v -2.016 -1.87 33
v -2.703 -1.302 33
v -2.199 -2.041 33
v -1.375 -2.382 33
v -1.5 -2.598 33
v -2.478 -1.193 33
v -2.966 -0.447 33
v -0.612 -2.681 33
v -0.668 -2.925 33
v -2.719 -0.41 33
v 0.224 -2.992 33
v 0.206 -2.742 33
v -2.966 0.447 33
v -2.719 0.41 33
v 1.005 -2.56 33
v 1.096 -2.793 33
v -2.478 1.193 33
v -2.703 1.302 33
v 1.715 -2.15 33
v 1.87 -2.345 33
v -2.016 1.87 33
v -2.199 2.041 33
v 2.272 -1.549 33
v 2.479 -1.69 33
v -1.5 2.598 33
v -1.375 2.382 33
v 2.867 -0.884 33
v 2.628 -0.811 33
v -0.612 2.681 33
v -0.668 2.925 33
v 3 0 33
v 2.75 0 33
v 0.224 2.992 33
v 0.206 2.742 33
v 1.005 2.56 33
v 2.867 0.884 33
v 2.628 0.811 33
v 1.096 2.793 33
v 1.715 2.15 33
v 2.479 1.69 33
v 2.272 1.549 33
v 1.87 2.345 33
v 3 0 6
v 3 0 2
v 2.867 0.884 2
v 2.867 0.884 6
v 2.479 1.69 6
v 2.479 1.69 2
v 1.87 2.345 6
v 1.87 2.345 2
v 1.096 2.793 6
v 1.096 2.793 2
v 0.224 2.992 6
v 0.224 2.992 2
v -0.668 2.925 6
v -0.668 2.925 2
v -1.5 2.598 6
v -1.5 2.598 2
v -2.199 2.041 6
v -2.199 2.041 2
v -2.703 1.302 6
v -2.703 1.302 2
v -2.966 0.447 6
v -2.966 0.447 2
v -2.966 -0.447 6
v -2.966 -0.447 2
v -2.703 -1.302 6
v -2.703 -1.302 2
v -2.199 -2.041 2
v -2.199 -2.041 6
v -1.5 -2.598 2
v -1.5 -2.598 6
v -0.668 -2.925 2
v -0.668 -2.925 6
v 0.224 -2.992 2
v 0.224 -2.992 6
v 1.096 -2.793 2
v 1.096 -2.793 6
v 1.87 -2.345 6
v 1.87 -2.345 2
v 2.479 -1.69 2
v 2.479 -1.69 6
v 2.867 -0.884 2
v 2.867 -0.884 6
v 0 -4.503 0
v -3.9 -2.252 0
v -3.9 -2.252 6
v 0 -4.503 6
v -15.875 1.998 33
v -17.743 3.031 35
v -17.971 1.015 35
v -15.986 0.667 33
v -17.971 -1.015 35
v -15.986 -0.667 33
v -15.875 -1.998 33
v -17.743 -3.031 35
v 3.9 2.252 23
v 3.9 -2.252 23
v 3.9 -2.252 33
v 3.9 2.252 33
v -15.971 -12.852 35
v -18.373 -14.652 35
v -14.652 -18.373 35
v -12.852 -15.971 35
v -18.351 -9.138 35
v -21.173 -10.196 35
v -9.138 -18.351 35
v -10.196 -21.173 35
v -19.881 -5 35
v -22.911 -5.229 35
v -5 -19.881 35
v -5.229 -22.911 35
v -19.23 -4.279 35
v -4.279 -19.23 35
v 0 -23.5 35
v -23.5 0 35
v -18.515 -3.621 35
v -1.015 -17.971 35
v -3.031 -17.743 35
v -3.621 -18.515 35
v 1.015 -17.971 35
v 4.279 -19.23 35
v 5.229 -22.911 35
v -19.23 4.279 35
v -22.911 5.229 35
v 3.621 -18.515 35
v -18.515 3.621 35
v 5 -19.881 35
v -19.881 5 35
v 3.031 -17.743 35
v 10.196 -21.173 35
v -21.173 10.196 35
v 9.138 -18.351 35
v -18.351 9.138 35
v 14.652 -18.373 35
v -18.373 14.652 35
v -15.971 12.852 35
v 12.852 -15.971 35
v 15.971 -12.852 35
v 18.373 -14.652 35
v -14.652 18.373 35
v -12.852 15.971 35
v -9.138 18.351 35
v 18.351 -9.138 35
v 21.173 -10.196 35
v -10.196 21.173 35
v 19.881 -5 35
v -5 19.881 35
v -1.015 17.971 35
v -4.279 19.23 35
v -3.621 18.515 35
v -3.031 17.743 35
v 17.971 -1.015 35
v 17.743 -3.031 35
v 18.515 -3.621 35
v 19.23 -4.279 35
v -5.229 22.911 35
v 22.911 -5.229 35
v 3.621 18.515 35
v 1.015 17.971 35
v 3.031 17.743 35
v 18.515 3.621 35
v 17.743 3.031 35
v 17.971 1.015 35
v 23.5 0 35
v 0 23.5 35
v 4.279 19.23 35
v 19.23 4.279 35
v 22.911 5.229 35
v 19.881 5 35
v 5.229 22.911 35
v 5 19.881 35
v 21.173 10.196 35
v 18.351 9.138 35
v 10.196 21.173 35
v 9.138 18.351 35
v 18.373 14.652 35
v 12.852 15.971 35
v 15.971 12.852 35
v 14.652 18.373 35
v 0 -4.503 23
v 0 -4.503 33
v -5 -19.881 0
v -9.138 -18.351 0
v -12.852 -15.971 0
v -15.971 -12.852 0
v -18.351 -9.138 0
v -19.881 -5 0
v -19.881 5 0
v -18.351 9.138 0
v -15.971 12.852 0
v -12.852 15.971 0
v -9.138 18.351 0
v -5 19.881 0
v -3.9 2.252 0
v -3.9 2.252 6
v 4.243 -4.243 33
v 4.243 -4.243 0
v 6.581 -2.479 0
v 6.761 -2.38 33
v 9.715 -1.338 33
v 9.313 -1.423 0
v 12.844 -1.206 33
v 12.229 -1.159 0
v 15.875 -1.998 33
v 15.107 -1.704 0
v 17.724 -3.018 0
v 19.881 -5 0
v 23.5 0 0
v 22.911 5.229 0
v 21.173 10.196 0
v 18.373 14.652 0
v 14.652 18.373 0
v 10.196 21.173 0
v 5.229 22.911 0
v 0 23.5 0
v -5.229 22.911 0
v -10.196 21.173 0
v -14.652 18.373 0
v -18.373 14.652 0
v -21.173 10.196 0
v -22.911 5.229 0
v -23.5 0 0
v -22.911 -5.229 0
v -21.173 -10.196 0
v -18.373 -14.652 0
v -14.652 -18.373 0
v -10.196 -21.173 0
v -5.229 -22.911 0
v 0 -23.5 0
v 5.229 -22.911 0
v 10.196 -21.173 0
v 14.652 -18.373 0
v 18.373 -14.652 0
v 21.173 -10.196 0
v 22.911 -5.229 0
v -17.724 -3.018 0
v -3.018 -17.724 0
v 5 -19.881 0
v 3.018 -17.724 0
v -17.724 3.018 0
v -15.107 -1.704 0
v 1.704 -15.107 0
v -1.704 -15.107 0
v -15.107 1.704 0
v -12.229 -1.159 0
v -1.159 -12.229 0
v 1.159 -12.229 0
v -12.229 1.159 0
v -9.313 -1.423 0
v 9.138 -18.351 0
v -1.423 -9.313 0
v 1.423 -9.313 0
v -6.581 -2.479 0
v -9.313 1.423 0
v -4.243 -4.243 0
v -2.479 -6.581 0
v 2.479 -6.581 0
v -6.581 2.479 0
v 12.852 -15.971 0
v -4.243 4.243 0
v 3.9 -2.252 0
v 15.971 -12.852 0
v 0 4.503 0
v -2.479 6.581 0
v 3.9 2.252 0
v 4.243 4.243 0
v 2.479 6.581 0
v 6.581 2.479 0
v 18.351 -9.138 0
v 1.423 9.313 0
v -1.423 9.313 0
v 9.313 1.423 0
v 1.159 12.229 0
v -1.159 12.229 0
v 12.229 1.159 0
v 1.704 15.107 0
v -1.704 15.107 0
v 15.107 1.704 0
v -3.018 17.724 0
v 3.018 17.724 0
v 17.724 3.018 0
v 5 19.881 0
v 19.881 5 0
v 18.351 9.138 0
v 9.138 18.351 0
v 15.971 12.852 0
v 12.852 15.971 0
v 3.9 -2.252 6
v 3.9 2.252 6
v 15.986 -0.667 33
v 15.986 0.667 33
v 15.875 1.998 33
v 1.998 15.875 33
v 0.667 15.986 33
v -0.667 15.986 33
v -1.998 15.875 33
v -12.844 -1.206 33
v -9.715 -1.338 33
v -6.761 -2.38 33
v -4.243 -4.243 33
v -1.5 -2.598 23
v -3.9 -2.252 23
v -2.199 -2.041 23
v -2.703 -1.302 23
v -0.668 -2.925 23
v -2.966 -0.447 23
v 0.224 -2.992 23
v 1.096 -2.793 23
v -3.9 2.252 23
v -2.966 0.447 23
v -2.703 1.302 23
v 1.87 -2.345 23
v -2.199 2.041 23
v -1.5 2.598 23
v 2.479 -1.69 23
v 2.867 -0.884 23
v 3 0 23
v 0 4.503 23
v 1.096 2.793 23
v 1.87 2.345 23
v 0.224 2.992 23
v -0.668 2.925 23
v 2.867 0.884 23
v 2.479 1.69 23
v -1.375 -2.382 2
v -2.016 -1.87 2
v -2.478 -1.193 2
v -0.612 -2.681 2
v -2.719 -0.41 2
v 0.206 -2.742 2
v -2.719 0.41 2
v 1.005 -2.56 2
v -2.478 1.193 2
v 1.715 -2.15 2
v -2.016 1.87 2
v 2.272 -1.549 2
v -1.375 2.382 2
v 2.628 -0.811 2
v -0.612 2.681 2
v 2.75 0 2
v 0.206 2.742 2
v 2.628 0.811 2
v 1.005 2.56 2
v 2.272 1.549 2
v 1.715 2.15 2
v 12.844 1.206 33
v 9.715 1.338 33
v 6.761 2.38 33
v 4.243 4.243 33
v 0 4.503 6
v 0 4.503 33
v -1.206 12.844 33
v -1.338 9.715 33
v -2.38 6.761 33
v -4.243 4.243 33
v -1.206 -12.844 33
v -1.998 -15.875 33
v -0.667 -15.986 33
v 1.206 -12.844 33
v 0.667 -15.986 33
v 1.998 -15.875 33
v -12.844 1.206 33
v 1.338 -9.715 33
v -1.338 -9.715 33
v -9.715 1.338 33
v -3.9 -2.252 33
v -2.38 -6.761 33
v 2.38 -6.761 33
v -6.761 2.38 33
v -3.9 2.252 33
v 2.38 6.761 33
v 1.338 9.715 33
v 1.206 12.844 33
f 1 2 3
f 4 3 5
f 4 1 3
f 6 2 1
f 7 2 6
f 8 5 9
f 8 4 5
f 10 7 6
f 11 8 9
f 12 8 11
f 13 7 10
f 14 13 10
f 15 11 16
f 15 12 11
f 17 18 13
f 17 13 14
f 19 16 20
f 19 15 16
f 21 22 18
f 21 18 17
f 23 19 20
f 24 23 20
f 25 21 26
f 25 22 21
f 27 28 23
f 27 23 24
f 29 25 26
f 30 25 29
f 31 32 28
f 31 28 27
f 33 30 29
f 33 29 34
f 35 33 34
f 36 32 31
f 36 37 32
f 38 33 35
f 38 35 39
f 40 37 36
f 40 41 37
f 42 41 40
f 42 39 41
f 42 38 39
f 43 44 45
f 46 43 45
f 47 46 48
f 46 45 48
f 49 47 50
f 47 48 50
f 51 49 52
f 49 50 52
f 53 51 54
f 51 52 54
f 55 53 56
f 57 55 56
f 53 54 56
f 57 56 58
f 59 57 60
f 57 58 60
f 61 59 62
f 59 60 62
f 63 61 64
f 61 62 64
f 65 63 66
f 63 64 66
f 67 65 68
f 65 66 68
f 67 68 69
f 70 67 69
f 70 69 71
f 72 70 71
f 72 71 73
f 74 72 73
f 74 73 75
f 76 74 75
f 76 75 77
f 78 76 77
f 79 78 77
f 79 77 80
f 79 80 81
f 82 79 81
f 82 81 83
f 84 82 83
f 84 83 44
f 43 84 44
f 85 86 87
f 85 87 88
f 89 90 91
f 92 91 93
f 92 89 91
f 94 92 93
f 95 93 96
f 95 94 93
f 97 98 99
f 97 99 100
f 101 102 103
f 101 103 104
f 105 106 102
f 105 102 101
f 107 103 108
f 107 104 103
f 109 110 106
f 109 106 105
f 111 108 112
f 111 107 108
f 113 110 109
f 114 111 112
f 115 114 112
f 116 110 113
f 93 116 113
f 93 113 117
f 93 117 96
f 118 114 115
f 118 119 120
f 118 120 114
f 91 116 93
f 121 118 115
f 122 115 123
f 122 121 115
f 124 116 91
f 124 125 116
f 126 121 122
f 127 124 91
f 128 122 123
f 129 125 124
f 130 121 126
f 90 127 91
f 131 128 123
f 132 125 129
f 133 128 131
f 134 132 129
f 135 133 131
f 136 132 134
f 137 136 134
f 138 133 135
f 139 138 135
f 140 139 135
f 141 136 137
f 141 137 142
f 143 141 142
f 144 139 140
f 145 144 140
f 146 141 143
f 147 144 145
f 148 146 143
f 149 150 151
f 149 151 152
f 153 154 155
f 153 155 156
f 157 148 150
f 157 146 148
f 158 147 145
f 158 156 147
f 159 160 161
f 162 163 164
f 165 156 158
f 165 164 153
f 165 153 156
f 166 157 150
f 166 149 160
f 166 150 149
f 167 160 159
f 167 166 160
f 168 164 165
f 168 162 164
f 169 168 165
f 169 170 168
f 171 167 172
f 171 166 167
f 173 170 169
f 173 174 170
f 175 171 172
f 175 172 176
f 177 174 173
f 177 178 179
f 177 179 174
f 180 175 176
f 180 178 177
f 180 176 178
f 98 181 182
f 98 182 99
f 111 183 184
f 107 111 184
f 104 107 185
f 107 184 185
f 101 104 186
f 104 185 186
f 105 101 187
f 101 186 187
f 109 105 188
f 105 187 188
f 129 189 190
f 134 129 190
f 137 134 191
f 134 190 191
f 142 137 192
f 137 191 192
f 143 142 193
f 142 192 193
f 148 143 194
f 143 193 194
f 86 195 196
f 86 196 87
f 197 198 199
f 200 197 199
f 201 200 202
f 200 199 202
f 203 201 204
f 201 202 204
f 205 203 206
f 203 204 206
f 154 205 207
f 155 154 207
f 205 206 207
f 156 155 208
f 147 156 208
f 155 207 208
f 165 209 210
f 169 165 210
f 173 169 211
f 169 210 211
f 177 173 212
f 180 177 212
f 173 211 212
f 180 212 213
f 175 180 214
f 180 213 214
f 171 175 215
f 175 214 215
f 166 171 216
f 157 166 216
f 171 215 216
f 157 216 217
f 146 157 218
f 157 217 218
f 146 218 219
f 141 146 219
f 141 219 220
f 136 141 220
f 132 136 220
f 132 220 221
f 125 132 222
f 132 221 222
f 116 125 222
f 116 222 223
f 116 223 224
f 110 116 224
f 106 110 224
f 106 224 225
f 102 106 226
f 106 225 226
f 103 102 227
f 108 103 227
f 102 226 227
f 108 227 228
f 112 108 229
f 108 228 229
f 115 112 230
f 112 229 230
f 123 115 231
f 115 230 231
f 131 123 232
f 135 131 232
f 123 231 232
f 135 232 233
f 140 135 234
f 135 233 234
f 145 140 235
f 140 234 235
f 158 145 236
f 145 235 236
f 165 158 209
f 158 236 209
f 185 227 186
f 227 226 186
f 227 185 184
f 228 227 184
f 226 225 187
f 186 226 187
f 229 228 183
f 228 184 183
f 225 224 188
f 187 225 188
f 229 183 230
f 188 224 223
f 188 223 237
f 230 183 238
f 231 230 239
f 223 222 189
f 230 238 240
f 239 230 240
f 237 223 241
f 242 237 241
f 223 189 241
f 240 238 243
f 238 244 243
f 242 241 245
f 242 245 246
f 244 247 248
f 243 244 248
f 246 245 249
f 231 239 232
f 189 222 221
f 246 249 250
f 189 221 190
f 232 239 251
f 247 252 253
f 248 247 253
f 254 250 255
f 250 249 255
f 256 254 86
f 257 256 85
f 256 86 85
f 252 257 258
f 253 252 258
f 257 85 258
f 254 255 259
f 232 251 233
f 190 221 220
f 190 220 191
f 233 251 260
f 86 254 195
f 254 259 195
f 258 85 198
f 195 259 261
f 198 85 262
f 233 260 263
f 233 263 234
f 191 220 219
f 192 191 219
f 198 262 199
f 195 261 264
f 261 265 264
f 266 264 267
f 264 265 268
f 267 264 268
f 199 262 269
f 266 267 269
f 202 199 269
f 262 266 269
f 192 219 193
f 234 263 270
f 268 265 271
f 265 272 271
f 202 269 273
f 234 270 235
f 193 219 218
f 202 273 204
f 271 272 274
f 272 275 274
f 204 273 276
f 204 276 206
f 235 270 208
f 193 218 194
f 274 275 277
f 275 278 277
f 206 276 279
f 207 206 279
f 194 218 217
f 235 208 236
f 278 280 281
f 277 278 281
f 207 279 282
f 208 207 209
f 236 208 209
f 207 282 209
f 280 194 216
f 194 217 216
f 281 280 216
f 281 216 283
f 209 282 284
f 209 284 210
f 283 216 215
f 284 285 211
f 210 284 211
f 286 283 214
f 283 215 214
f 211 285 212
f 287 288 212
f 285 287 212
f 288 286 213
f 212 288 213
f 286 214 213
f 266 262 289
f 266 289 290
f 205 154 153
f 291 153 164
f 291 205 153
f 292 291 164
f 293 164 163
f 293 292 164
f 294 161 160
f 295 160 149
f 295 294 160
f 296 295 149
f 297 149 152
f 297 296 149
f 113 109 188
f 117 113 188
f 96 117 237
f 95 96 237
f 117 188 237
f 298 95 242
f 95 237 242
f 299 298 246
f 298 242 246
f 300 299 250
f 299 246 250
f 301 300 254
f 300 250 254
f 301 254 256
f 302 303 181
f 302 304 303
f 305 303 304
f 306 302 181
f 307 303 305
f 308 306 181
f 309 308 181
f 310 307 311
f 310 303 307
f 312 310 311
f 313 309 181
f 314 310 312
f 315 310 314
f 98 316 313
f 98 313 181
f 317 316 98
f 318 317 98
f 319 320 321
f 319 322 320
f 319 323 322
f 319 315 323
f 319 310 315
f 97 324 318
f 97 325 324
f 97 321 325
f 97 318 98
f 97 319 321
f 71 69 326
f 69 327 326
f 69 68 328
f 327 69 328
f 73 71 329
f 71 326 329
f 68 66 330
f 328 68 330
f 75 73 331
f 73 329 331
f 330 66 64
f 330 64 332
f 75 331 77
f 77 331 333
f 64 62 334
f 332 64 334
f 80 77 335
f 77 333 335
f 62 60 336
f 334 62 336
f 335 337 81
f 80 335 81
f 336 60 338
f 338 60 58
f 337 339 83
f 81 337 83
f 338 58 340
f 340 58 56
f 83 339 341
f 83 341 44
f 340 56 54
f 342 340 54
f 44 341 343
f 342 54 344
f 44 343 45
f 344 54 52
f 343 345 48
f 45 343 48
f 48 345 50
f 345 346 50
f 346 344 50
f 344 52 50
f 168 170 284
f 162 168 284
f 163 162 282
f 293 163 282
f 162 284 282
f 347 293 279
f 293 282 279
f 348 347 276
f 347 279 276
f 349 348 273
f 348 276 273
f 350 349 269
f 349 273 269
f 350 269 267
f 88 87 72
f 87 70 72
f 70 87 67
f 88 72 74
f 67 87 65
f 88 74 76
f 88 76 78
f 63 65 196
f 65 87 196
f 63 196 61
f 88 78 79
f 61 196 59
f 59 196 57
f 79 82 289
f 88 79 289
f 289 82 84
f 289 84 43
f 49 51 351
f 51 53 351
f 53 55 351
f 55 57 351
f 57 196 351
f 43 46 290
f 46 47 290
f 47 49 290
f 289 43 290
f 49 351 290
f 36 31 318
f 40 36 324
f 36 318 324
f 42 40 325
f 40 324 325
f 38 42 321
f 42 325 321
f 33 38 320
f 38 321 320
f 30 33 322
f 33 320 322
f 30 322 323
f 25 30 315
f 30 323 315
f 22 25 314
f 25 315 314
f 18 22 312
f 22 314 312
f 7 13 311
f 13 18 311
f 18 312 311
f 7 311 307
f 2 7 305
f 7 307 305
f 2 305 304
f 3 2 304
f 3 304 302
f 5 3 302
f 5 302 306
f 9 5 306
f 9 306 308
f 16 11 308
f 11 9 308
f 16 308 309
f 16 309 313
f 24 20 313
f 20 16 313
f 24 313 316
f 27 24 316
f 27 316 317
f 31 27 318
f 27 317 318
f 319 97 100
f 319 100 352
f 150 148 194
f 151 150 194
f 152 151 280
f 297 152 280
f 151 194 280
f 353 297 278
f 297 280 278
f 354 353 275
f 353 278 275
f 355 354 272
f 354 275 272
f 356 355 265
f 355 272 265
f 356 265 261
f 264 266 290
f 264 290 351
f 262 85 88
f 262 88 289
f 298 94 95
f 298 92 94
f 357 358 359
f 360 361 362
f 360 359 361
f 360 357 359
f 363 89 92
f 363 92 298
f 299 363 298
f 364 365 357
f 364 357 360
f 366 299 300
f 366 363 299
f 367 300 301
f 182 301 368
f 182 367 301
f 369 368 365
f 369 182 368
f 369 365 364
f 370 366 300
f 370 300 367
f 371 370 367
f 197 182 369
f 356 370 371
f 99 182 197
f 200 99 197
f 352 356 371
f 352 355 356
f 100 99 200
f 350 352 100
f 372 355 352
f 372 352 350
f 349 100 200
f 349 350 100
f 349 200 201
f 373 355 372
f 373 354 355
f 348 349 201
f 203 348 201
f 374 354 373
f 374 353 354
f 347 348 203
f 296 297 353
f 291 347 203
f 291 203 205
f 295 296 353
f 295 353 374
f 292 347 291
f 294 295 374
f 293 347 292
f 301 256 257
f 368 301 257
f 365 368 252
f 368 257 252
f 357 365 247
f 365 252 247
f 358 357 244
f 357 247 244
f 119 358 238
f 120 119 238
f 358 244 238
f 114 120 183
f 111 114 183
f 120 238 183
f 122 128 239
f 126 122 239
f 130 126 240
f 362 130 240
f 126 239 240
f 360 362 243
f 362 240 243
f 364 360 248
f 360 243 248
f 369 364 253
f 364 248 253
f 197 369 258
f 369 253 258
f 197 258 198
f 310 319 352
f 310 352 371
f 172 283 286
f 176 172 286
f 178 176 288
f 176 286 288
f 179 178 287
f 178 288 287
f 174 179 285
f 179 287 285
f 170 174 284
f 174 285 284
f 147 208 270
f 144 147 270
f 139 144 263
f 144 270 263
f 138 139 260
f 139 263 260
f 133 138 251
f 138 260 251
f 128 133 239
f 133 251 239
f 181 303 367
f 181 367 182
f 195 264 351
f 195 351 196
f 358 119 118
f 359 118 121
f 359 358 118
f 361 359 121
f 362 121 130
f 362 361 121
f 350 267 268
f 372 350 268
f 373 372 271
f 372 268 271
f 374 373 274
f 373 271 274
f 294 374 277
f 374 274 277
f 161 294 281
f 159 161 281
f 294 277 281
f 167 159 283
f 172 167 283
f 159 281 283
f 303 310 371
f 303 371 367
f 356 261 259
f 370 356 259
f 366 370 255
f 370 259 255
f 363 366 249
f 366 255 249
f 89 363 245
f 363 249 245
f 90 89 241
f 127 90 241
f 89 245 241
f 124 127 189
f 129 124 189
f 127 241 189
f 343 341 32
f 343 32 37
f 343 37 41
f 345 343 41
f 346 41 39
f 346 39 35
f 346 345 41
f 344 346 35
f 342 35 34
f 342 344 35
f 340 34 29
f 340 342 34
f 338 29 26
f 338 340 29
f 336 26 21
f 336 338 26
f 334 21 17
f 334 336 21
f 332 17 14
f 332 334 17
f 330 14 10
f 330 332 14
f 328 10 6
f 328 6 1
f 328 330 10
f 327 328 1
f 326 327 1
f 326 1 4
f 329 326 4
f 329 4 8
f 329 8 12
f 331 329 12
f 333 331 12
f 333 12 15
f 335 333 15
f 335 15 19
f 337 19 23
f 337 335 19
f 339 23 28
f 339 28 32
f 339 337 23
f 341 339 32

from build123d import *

# Parameters (mm, degrees)
F0_R     = 23.5
F0_R_2   = 22.5
F0_R_3   = 3
F1_DEPTH = 35
F2_START = 2
F0_R_4   = 2.75
F2_DEPTH = 31
F4_DEPTH = 6
F5_START = 23
F5_DEPTH = 12


# Not quite as in the source:
# - a fillet or chamfer that OpenCascade refuses, or shapes differently, is made with other operations: its cross-section is extruded or revolved along the edge and cut away or added


with BuildPart() as f1:
    # F0 (on Top) → F1 (new body)
    with BuildSketch(Plane.XY):
        Circle(F0_R)
        Circle(F0_R_2, mode=Mode.SUBTRACT)
        Circle(F0_R_2)
        with BuildLine():
            ThreePointArc((19.8808953521, 5), (20.3446351002, 2.5190916302), (20.5, 0))
            ThreePointArc((20.5, 0), (20.3446351002, -2.5190916302), (19.8808953521, -5))
            ThreePointArc((19.8808953521, -5), (14.4956890143, -14.4956890143), (5, -19.8808953521))
            ThreePointArc((5, -19.8808953521), (0, -20.5), (-5, -19.8808953521))
            ThreePointArc((-5, -19.8808953521), (-14.4956890143, -14.4956890143), (-19.8808953521, -5))
            ThreePointArc((-19.8808953521, -5), (-20.5, 0), (-19.8808953521, 5))
            ThreePointArc((-19.8808953521, 5), (-14.4956890143, 14.4956890143), (-5, 19.8808953521))
            ThreePointArc((-5, 19.8808953521), (0, 20.5), (5, 19.8808953521))
            ThreePointArc((5, 19.8808953521), (14.4956890143, 14.4956890143), (19.8808953521, 5))
        make_face(mode=Mode.SUBTRACT)
        with BuildLine():
            ThreePointArc((6, 0), (5.5432771953, 2.2961005937), (4.2426406878, 4.2426406864))
            ThreePointArc((4.2426406878, 4.2426406864), (7.8e-09, 6), (-4.2426406768, 4.2426406974))
            ThreePointArc((-4.2426406768, 4.2426406974), (-6, 7.9e-09), (-4.242640688, -4.2426406862))
            ThreePointArc((-4.242640688, -4.2426406862), (-1.21e-08, -6), (4.2426406709, -4.2426407033))
            ThreePointArc((4.2426406709, -4.2426407033), (5.5432771907, -2.2961006048), (6, 0))
        make_face()
        Polygon((-3.9, -2.2516660498), (-3.9, 2.2516660498), (0, 4.5033320997), (3.9, 2.2516660498), (3.9, -2.2516660498), (0, -4.5033320997), align=None, mode=Mode.SUBTRACT)
        with BuildLine():
            ThreePointArc((4.2426406878, 4.2426406864), (1.1585914251, 12.2294676794), (5, 19.8808953521))
            ThreePointArc((5, 19.8808953521), (0, 20.5), (-5, 19.8808953521))
            ThreePointArc((-5, 19.8808953521), (-1.1585914255, 12.2294676871), (-4.2426406768, 4.2426406974))
            ThreePointArc((-4.2426406768, 4.2426406974), (7.8e-09, 6), (4.2426406878, 4.2426406864))
        make_face()
        with BuildLine():
            ThreePointArc((19.8808953521, -5), (20.3446351002, -2.5190916302), (20.5, 0))
            ThreePointArc((20.5, 0), (20.3446351002, 2.5190916302), (19.8808953521, 5))
            ThreePointArc((19.8808953521, 5), (12.2294676803, 1.1585914252), (4.2426406878, 4.2426406864))
            ThreePointArc((4.2426406878, 4.2426406864), (5.5432771953, 2.2961005937), (6, 0))
            ThreePointArc((6, 0), (5.5432771907, -2.2961006048), (4.2426406709, -4.2426407033))
            ThreePointArc((4.2426406709, -4.2426407033), (12.2294676684, -1.1585914246), (19.8808953521, -5))
        make_face()
        with BuildLine():
            ThreePointArc((-5, -19.8808953521), (0, -20.5), (5, -19.8808953521))
            ThreePointArc((5, -19.8808953521), (1.1585914257, -12.2294676913), (4.2426406709, -4.2426407033))
            ThreePointArc((4.2426406709, -4.2426407033), (-1.21e-08, -6), (-4.242640688, -4.2426406862))
            ThreePointArc((-4.242640688, -4.2426406862), (-1.1585914251, -12.2294676792), (-5, -19.8808953521))
        make_face()
        with BuildLine():
            ThreePointArc((-4.242640688, -4.2426406862), (-6, 7.9e-09), (-4.2426406768, 4.2426406974))
            ThreePointArc((-4.2426406768, 4.2426406974), (-12.2294676726, 1.1585914248), (-19.8808953521, 5))
            ThreePointArc((-19.8808953521, 5), (-20.5, 0), (-19.8808953521, -5))
            ThreePointArc((-19.8808953521, -5), (-12.2294676805, -1.1585914252), (-4.242640688, -4.2426406862))
        make_face()
        Polygon((0, 4.5033320997), (-3.9, 2.2516660498), (-3.9, -2.2516660498), (0, -4.5033320997), (3.9, -2.2516660498), (3.9, 2.2516660498), align=None)
        Circle(F0_R_3, mode=Mode.SUBTRACT)
    extrude(amount=F1_DEPTH)

    # F0 (on Top) → F2 (join)
    with BuildSketch(Plane.XY.offset(F2_START)):
        Circle(F0_R_3)
        Circle(F0_R_4, mode=Mode.SUBTRACT)
    extrude(amount=F2_DEPTH)

    # F3: chamfer of 15 on 1 edges, made by hand


with BuildPart() as f3_tool2:
    # F3_s3 → F3_t4 (revolve)
    with BuildSketch(Plane.XZ):
        Polygon((18, 35), (3, 20), (3, 35), align=None)
    revolve(axis=Axis((0, 0, 35), (0, 0, 1)))

    split(bisect_by=Plane.XY.offset(33), keep=Keep.TOP)


with BuildPart() as f1_1:
    add(f1.part)

    # F3_t1: cut F3_tool2
    add(f3_tool2.part, mode=Mode.SUBTRACT)

    # F0 (on Top) → F4 (cut)
    with BuildSketch(Plane.XY):
        Polygon((0, 4.5033320997), (-3.9, 2.2516660498), (-3.9, -2.2516660498), (0, -4.5033320997), (3.9, -2.2516660498), (3.9, 2.2516660498), align=None)
        Circle(F0_R_3, mode=Mode.SUBTRACT)
    extrude(amount=F4_DEPTH, mode=Mode.SUBTRACT)

    # F0 (on Top) → F5 (cut)
    with BuildSketch(Plane.XY.offset(F5_START)):
        Polygon((0, 4.5033320997), (-3.9, 2.2516660498), (-3.9, -2.2516660498), (0, -4.5033320997), (3.9, -2.2516660498), (3.9, 2.2516660498), align=None)
        Circle(F0_R_3, mode=Mode.SUBTRACT)
    extrude(amount=F5_DEPTH, mode=Mode.SUBTRACT)


solid = f1_1.part
